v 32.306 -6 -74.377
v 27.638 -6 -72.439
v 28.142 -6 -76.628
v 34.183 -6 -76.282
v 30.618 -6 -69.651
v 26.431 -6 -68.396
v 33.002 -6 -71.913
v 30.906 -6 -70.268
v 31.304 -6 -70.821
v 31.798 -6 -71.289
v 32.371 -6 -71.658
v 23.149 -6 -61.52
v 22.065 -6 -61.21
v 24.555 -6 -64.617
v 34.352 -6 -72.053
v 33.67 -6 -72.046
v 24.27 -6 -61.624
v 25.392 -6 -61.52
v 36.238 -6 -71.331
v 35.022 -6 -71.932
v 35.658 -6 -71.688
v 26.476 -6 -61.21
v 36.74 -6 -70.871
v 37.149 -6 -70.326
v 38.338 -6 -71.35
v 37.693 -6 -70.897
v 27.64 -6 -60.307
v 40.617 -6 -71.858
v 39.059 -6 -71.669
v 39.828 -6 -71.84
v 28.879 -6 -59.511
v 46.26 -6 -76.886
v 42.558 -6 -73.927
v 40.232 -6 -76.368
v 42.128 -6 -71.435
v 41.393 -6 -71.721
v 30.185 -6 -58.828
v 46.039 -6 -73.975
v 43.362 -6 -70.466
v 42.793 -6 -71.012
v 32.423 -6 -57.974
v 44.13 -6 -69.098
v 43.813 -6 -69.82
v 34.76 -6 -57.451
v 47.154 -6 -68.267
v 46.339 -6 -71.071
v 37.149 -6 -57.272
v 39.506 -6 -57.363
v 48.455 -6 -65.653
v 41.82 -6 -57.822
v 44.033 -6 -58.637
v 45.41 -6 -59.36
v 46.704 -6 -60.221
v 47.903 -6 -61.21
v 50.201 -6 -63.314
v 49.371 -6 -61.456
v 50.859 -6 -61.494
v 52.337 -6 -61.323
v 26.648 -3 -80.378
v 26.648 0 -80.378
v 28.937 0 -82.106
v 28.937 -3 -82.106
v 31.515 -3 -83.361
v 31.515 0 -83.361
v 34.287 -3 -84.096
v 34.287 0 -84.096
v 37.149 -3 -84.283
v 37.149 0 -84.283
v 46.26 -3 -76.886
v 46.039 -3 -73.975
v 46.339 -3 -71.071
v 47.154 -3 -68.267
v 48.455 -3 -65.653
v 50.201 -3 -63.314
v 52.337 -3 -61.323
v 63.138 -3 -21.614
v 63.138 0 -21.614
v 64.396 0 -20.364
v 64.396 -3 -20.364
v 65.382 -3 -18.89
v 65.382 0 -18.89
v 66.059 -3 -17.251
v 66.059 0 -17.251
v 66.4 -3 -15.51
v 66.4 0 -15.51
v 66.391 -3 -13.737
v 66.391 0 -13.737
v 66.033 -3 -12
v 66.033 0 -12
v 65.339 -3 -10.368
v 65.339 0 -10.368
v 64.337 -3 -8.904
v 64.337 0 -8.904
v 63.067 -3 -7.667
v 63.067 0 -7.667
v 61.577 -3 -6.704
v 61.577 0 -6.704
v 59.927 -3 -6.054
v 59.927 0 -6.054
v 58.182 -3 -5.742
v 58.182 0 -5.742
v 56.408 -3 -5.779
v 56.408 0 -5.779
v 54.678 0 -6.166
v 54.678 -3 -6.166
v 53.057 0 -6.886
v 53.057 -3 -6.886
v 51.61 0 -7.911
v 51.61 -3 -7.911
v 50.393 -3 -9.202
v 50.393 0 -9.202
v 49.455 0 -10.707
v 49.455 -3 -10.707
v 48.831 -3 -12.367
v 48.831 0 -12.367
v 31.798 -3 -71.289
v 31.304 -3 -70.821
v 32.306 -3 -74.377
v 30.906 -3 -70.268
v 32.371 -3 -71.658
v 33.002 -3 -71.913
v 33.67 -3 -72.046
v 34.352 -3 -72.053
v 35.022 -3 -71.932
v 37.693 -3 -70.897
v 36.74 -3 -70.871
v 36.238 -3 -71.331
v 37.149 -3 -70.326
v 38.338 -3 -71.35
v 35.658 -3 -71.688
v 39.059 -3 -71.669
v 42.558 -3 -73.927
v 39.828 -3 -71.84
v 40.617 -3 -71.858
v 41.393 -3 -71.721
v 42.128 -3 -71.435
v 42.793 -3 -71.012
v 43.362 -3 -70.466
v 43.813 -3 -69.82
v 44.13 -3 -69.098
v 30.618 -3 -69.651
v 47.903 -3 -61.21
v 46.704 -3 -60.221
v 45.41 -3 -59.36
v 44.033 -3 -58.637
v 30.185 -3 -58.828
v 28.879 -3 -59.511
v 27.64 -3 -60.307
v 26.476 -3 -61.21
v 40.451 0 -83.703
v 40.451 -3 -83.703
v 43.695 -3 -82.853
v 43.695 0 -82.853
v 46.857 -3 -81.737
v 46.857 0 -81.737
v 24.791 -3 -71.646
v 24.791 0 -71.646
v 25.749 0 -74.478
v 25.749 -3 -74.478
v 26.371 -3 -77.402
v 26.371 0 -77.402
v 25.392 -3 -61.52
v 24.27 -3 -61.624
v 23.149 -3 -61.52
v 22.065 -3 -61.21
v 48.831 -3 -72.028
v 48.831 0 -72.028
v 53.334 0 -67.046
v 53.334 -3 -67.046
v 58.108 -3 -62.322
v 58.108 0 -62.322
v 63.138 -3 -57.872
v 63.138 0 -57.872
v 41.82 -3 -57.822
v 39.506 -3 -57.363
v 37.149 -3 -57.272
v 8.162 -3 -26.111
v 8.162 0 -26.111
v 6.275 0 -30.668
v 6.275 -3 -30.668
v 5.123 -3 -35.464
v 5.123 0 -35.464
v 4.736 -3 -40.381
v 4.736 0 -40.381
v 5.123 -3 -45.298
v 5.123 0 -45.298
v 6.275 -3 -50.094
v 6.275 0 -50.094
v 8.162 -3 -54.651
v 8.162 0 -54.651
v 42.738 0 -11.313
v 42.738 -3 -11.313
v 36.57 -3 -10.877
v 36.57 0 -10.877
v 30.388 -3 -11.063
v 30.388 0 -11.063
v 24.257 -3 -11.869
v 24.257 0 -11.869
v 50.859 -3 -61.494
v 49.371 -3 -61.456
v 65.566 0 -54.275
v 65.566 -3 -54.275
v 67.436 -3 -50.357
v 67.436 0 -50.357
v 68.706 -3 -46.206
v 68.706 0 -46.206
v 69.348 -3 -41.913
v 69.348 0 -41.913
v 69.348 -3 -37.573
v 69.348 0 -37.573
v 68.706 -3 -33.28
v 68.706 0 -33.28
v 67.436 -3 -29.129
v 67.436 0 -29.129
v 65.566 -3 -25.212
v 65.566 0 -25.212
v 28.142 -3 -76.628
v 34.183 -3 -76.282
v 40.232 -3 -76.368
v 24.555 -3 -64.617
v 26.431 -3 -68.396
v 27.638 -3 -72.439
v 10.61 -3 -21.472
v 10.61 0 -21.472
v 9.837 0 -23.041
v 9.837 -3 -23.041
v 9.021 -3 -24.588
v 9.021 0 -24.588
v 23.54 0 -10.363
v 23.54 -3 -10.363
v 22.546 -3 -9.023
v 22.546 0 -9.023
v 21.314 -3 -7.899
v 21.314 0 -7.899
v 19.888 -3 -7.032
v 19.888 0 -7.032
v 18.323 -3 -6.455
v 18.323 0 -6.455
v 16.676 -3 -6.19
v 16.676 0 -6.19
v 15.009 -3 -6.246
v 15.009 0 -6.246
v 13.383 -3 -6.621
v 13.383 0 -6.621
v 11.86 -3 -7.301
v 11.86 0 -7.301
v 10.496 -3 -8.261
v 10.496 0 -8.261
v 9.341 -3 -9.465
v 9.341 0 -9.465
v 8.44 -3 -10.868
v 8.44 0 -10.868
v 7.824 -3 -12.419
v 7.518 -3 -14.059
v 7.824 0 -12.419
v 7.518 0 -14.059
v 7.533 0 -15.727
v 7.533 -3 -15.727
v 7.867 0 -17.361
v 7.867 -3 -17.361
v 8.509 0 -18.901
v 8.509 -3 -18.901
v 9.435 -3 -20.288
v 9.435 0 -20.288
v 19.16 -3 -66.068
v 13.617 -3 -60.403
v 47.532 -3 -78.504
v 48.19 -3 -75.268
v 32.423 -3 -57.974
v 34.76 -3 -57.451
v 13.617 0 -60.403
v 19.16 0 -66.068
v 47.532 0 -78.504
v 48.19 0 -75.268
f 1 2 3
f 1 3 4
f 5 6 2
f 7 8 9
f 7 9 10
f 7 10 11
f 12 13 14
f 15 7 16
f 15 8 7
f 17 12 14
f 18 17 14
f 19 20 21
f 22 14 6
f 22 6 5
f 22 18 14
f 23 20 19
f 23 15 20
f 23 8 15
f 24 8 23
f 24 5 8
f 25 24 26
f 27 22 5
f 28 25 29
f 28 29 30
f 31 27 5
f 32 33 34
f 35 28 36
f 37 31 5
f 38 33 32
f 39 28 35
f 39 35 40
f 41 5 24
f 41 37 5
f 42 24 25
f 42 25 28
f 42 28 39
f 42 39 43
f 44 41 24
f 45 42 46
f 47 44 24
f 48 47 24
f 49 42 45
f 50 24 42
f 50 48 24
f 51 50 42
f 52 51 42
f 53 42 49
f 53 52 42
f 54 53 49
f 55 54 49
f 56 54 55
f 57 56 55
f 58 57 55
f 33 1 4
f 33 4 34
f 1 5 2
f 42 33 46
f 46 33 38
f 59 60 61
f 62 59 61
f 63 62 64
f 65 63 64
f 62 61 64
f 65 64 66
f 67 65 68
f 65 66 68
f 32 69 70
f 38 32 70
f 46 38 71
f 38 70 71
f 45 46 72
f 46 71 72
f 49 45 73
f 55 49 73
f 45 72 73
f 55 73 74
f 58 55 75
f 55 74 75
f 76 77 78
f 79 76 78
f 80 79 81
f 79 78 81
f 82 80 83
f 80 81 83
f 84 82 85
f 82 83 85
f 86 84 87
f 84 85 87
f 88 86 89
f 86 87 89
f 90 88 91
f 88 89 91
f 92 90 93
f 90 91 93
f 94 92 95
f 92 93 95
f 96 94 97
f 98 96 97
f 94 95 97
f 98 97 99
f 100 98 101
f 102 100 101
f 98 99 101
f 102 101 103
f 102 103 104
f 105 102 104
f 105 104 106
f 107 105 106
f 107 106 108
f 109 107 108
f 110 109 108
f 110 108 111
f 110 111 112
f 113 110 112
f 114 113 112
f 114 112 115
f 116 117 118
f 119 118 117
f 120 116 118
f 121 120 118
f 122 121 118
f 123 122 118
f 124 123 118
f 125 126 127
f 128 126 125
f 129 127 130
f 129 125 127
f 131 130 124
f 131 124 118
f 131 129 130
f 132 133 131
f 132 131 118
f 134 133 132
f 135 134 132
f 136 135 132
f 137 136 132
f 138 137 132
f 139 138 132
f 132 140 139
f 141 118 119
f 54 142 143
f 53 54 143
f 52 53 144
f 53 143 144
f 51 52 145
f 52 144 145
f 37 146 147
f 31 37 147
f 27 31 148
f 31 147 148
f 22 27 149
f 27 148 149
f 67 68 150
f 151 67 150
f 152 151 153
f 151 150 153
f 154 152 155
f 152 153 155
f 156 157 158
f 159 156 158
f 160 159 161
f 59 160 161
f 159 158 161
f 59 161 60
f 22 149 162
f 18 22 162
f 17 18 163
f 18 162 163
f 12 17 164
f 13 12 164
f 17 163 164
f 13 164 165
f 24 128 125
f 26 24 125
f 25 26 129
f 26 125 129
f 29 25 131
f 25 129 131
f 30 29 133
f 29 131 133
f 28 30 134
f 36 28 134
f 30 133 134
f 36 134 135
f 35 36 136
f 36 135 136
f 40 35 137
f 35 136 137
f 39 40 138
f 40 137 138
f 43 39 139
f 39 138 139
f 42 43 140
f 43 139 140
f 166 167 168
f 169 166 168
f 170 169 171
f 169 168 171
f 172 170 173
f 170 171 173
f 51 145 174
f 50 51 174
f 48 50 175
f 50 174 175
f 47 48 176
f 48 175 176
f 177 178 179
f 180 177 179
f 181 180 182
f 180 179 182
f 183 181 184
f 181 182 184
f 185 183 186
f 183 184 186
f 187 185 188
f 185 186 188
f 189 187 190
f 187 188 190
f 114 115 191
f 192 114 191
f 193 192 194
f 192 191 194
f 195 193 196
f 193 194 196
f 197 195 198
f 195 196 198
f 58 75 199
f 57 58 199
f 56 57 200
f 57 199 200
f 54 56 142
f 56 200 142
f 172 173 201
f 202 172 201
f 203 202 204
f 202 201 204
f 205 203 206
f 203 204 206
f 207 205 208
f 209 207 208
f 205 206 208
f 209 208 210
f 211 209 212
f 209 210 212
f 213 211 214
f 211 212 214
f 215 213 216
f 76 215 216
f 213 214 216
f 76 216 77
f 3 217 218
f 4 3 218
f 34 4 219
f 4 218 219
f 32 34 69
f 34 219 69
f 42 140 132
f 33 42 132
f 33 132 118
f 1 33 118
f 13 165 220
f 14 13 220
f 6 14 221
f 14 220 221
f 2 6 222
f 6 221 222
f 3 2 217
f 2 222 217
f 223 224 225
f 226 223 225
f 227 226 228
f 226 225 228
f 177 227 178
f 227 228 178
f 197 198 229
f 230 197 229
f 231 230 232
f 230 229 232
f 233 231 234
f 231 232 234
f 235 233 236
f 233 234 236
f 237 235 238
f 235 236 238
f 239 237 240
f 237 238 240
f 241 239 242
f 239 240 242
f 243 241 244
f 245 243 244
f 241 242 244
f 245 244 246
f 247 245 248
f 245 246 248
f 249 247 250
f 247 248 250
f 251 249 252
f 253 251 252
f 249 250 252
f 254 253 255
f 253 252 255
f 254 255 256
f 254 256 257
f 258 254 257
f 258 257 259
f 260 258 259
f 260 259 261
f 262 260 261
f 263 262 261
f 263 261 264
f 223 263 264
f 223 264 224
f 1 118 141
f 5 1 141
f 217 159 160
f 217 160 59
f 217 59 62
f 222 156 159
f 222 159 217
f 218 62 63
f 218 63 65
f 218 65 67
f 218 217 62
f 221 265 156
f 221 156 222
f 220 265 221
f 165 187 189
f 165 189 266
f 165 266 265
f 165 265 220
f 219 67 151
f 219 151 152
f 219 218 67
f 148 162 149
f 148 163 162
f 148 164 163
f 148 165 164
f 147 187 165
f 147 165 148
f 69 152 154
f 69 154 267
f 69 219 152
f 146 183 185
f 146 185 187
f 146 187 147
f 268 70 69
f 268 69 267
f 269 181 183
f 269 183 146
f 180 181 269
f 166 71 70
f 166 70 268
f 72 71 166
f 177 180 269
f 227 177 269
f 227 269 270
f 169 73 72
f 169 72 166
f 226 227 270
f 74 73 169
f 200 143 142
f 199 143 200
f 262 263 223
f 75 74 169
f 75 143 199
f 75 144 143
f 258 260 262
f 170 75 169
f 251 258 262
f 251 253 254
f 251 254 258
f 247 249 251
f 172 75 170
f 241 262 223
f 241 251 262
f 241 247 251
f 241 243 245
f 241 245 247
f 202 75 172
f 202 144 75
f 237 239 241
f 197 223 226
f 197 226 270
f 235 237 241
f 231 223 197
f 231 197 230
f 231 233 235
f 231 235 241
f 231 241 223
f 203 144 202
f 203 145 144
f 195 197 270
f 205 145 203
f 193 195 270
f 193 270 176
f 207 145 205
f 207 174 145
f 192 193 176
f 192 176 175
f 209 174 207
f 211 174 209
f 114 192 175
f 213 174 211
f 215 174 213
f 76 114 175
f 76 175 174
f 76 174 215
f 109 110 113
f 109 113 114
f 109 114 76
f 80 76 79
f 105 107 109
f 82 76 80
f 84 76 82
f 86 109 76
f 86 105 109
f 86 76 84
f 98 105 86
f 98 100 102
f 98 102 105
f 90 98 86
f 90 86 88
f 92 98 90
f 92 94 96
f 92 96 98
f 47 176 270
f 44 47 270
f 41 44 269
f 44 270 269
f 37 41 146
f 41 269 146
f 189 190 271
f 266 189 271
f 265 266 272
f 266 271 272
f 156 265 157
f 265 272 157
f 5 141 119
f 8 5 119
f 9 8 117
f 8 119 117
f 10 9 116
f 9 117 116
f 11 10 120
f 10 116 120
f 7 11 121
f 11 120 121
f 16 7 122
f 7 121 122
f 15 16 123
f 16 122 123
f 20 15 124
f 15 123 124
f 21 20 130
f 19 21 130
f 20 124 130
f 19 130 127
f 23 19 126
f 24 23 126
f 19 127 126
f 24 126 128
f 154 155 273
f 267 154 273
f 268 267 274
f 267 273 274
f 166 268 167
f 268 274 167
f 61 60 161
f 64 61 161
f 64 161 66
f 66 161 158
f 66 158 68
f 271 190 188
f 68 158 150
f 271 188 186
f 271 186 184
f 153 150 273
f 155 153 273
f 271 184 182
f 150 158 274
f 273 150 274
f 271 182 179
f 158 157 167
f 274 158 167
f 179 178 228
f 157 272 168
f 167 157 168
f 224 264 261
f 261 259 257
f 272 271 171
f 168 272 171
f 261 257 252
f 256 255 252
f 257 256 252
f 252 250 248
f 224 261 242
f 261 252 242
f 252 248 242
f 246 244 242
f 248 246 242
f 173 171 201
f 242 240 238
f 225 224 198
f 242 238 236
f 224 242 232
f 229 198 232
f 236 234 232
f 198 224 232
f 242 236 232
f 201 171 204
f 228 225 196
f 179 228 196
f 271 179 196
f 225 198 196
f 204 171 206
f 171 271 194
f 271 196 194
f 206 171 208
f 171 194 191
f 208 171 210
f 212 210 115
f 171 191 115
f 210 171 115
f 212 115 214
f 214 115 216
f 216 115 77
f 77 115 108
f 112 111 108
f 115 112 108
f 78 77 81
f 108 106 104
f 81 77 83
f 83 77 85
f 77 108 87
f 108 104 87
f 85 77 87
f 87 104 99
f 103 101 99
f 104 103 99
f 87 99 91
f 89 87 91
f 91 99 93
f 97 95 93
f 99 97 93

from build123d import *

# Parameters (mm, degrees)
F1_DEPTH = 3
F3_DEPTH = 3
F4_DEPTH = 3


with BuildPart() as f1:
    # F0 (on Front) → F1 (new body)
    with BuildSketch(Plane.XZ):
        with BuildLine():
            ThreePointArc((10.610182, -21.472413), (9.43467, -23.817103), (8.162286, -26.110668))
            ThreePointArc((8.162286, -26.110668), (4.736187, -40.380972), (8.162286, -54.651275))
            ThreePointArc((8.162286, -54.651275), (16.377217, -63.246062), (24.791062, -71.646221))
            ThreePointArc((24.791062, -71.646221), (26.102479, -75.930715), (26.647892, -80.3781))
            ThreePointArc((26.647892, -80.3781), (31.515082, -83.360934), (37.148613, -84.282979))
            ThreePointArc((37.148613, -84.282979), (42.081838, -83.311469), (46.856795, -81.736565))
            ThreePointArc((46.856795, -81.736565), (47.86306, -76.886336), (48.831385, -72.028391))
            ThreePointArc((48.831385, -72.028391), (55.688335, -64.651002), (63.137703, -57.872318))
            ThreePointArc((63.137703, -57.872318), (69.428725, -39.743128), (63.137703, -21.613939))
            ThreePointArc((63.137703, -21.613939), (62.345878, -7.148671), (48.831385, -12.366854))
            ThreePointArc((48.831385, -12.366854), (36.569551, -10.876763), (24.25742, -11.868899))
            ThreePointArc((24.25742, -11.868899), (11.154848, -7.747843), (10.610182, -21.472413))
        make_face()
    extrude(amount=F1_DEPTH)

    # F2 (on face) → F3 (join)
    with BuildSketch(Plane.XZ.offset(3)):
        with BuildLine():
            ThreePointArc((22.065133, -61.21042), (26.430602, -68.396115), (28.142098, -76.627903))
            ThreePointArc((28.142098, -76.627903), (37.20821, -76.271267), (46.260461, -76.886336))
            ThreePointArc((46.260461, -76.886336), (47.153606, -68.266964), (52.337427, -61.322954))
            ThreePointArc((52.337427, -61.322954), (50.114304, -61.50095), (47.903072, -61.21042))
            ThreePointArc((47.903072, -61.21042), (46.555062, -64.457231), (43.912064, -66.775307))
            ThreePointArc((43.912064, -66.775307), (44.722613, -62.717523), (44.03321, -58.637409))
            ThreePointArc((44.03321, -58.637409), (40.671762, -57.546974), (37.148613, -57.271644))
            ThreePointArc((37.148613, -57.271644), (33.581827, -57.670054), (30.184889, -58.828287))
            ThreePointArc((30.184889, -58.828287), (29.6759, -62.863739), (30.266298, -66.888086))
            ThreePointArc((30.266298, -66.888086), (27.649068, -64.531266), (26.475836, -61.21042))
            ThreePointArc((26.475836, -61.21042), (24.270484, -61.623817), (22.065133, -61.21042))
        make_face()
        with BuildLine():
            Line((32.305945, -74.377179), (30.617898, -69.65065))
            ThreePointArc((30.617898, -69.65065), (33.670475, -72.046287), (37.148613, -70.325866))
            ThreePointArc((37.148613, -70.325866), (41.008138, -71.808616), (44.129851, -69.097642))
            Line((44.129851, -69.097642), (42.557646, -73.926551))
            Line((42.557646, -73.926551), (32.305945, -74.377179))
        make_face(mode=Mode.SUBTRACT)
        with BuildLine():
            ThreePointArc((30.184889, -58.828287), (28.250667, -59.895266), (26.475836, -61.21042))
            ThreePointArc((26.475836, -61.21042), (27.649068, -64.531266), (30.266298, -66.888086))
            ThreePointArc((30.266298, -66.888086), (29.6759, -62.863739), (30.184889, -58.828287))
        make_face()
        with BuildLine():
            ThreePointArc((43.912064, -66.775307), (46.555062, -64.457231), (47.903072, -61.21042))
            ThreePointArc((47.903072, -61.21042), (46.068198, -59.773426), (44.03321, -58.637409))
            ThreePointArc((44.03321, -58.637409), (44.722613, -62.717523), (43.912064, -66.775307))
        make_face()
    extrude(amount=F3_DEPTH)

    # F2 (on face) → F4 (join)
    with BuildSketch(Plane.XZ.offset(3)):
        with BuildLine():
            ThreePointArc((22.065133, -61.21042), (26.430602, -68.396115), (28.142098, -76.627903))
            ThreePointArc((28.142098, -76.627903), (37.20821, -76.271267), (46.260461, -76.886336))
            ThreePointArc((46.260461, -76.886336), (47.153606, -68.266964), (52.337427, -61.322954))
            ThreePointArc((52.337427, -61.322954), (50.114304, -61.50095), (47.903072, -61.21042))
            ThreePointArc((47.903072, -61.21042), (46.555062, -64.457231), (43.912064, -66.775307))
            ThreePointArc((43.912064, -66.775307), (44.722613, -62.717523), (44.03321, -58.637409))
            ThreePointArc((44.03321, -58.637409), (40.671762, -57.546974), (37.148613, -57.271644))
            ThreePointArc((37.148613, -57.271644), (33.581827, -57.670054), (30.184889, -58.828287))
            ThreePointArc((30.184889, -58.828287), (29.6759, -62.863739), (30.266298, -66.888086))
            ThreePointArc((30.266298, -66.888086), (27.649068, -64.531266), (26.475836, -61.21042))
            ThreePointArc((26.475836, -61.21042), (24.270484, -61.623817), (22.065133, -61.21042))
        make_face()
        with BuildLine():
            Line((32.305945, -74.377179), (30.617898, -69.65065))
            ThreePointArc((30.617898, -69.65065), (33.670475, -72.046287), (37.148613, -70.325866))
            ThreePointArc((37.148613, -70.325866), (41.008138, -71.808616), (44.129851, -69.097642))
            Line((44.129851, -69.097642), (42.557646, -73.926551))
            Line((42.557646, -73.926551), (32.305945, -74.377179))
        make_face(mode=Mode.SUBTRACT)
        with BuildLine():
            ThreePointArc((30.184889, -58.828287), (28.250667, -59.895266), (26.475836, -61.21042))
            ThreePointArc((26.475836, -61.21042), (27.649068, -64.531266), (30.266298, -66.888086))
            ThreePointArc((30.266298, -66.888086), (29.6759, -62.863739), (30.184889, -58.828287))
        make_face()
        with BuildLine():
            ThreePointArc((43.912064, -66.775307), (46.555062, -64.457231), (47.903072, -61.21042))
            ThreePointArc((47.903072, -61.21042), (46.068198, -59.773426), (44.03321, -58.637409))
            ThreePointArc((44.03321, -58.637409), (44.722613, -62.717523), (43.912064, -66.775307))
        make_face()
    extrude(amount=F4_DEPTH)


solid = f1.part
